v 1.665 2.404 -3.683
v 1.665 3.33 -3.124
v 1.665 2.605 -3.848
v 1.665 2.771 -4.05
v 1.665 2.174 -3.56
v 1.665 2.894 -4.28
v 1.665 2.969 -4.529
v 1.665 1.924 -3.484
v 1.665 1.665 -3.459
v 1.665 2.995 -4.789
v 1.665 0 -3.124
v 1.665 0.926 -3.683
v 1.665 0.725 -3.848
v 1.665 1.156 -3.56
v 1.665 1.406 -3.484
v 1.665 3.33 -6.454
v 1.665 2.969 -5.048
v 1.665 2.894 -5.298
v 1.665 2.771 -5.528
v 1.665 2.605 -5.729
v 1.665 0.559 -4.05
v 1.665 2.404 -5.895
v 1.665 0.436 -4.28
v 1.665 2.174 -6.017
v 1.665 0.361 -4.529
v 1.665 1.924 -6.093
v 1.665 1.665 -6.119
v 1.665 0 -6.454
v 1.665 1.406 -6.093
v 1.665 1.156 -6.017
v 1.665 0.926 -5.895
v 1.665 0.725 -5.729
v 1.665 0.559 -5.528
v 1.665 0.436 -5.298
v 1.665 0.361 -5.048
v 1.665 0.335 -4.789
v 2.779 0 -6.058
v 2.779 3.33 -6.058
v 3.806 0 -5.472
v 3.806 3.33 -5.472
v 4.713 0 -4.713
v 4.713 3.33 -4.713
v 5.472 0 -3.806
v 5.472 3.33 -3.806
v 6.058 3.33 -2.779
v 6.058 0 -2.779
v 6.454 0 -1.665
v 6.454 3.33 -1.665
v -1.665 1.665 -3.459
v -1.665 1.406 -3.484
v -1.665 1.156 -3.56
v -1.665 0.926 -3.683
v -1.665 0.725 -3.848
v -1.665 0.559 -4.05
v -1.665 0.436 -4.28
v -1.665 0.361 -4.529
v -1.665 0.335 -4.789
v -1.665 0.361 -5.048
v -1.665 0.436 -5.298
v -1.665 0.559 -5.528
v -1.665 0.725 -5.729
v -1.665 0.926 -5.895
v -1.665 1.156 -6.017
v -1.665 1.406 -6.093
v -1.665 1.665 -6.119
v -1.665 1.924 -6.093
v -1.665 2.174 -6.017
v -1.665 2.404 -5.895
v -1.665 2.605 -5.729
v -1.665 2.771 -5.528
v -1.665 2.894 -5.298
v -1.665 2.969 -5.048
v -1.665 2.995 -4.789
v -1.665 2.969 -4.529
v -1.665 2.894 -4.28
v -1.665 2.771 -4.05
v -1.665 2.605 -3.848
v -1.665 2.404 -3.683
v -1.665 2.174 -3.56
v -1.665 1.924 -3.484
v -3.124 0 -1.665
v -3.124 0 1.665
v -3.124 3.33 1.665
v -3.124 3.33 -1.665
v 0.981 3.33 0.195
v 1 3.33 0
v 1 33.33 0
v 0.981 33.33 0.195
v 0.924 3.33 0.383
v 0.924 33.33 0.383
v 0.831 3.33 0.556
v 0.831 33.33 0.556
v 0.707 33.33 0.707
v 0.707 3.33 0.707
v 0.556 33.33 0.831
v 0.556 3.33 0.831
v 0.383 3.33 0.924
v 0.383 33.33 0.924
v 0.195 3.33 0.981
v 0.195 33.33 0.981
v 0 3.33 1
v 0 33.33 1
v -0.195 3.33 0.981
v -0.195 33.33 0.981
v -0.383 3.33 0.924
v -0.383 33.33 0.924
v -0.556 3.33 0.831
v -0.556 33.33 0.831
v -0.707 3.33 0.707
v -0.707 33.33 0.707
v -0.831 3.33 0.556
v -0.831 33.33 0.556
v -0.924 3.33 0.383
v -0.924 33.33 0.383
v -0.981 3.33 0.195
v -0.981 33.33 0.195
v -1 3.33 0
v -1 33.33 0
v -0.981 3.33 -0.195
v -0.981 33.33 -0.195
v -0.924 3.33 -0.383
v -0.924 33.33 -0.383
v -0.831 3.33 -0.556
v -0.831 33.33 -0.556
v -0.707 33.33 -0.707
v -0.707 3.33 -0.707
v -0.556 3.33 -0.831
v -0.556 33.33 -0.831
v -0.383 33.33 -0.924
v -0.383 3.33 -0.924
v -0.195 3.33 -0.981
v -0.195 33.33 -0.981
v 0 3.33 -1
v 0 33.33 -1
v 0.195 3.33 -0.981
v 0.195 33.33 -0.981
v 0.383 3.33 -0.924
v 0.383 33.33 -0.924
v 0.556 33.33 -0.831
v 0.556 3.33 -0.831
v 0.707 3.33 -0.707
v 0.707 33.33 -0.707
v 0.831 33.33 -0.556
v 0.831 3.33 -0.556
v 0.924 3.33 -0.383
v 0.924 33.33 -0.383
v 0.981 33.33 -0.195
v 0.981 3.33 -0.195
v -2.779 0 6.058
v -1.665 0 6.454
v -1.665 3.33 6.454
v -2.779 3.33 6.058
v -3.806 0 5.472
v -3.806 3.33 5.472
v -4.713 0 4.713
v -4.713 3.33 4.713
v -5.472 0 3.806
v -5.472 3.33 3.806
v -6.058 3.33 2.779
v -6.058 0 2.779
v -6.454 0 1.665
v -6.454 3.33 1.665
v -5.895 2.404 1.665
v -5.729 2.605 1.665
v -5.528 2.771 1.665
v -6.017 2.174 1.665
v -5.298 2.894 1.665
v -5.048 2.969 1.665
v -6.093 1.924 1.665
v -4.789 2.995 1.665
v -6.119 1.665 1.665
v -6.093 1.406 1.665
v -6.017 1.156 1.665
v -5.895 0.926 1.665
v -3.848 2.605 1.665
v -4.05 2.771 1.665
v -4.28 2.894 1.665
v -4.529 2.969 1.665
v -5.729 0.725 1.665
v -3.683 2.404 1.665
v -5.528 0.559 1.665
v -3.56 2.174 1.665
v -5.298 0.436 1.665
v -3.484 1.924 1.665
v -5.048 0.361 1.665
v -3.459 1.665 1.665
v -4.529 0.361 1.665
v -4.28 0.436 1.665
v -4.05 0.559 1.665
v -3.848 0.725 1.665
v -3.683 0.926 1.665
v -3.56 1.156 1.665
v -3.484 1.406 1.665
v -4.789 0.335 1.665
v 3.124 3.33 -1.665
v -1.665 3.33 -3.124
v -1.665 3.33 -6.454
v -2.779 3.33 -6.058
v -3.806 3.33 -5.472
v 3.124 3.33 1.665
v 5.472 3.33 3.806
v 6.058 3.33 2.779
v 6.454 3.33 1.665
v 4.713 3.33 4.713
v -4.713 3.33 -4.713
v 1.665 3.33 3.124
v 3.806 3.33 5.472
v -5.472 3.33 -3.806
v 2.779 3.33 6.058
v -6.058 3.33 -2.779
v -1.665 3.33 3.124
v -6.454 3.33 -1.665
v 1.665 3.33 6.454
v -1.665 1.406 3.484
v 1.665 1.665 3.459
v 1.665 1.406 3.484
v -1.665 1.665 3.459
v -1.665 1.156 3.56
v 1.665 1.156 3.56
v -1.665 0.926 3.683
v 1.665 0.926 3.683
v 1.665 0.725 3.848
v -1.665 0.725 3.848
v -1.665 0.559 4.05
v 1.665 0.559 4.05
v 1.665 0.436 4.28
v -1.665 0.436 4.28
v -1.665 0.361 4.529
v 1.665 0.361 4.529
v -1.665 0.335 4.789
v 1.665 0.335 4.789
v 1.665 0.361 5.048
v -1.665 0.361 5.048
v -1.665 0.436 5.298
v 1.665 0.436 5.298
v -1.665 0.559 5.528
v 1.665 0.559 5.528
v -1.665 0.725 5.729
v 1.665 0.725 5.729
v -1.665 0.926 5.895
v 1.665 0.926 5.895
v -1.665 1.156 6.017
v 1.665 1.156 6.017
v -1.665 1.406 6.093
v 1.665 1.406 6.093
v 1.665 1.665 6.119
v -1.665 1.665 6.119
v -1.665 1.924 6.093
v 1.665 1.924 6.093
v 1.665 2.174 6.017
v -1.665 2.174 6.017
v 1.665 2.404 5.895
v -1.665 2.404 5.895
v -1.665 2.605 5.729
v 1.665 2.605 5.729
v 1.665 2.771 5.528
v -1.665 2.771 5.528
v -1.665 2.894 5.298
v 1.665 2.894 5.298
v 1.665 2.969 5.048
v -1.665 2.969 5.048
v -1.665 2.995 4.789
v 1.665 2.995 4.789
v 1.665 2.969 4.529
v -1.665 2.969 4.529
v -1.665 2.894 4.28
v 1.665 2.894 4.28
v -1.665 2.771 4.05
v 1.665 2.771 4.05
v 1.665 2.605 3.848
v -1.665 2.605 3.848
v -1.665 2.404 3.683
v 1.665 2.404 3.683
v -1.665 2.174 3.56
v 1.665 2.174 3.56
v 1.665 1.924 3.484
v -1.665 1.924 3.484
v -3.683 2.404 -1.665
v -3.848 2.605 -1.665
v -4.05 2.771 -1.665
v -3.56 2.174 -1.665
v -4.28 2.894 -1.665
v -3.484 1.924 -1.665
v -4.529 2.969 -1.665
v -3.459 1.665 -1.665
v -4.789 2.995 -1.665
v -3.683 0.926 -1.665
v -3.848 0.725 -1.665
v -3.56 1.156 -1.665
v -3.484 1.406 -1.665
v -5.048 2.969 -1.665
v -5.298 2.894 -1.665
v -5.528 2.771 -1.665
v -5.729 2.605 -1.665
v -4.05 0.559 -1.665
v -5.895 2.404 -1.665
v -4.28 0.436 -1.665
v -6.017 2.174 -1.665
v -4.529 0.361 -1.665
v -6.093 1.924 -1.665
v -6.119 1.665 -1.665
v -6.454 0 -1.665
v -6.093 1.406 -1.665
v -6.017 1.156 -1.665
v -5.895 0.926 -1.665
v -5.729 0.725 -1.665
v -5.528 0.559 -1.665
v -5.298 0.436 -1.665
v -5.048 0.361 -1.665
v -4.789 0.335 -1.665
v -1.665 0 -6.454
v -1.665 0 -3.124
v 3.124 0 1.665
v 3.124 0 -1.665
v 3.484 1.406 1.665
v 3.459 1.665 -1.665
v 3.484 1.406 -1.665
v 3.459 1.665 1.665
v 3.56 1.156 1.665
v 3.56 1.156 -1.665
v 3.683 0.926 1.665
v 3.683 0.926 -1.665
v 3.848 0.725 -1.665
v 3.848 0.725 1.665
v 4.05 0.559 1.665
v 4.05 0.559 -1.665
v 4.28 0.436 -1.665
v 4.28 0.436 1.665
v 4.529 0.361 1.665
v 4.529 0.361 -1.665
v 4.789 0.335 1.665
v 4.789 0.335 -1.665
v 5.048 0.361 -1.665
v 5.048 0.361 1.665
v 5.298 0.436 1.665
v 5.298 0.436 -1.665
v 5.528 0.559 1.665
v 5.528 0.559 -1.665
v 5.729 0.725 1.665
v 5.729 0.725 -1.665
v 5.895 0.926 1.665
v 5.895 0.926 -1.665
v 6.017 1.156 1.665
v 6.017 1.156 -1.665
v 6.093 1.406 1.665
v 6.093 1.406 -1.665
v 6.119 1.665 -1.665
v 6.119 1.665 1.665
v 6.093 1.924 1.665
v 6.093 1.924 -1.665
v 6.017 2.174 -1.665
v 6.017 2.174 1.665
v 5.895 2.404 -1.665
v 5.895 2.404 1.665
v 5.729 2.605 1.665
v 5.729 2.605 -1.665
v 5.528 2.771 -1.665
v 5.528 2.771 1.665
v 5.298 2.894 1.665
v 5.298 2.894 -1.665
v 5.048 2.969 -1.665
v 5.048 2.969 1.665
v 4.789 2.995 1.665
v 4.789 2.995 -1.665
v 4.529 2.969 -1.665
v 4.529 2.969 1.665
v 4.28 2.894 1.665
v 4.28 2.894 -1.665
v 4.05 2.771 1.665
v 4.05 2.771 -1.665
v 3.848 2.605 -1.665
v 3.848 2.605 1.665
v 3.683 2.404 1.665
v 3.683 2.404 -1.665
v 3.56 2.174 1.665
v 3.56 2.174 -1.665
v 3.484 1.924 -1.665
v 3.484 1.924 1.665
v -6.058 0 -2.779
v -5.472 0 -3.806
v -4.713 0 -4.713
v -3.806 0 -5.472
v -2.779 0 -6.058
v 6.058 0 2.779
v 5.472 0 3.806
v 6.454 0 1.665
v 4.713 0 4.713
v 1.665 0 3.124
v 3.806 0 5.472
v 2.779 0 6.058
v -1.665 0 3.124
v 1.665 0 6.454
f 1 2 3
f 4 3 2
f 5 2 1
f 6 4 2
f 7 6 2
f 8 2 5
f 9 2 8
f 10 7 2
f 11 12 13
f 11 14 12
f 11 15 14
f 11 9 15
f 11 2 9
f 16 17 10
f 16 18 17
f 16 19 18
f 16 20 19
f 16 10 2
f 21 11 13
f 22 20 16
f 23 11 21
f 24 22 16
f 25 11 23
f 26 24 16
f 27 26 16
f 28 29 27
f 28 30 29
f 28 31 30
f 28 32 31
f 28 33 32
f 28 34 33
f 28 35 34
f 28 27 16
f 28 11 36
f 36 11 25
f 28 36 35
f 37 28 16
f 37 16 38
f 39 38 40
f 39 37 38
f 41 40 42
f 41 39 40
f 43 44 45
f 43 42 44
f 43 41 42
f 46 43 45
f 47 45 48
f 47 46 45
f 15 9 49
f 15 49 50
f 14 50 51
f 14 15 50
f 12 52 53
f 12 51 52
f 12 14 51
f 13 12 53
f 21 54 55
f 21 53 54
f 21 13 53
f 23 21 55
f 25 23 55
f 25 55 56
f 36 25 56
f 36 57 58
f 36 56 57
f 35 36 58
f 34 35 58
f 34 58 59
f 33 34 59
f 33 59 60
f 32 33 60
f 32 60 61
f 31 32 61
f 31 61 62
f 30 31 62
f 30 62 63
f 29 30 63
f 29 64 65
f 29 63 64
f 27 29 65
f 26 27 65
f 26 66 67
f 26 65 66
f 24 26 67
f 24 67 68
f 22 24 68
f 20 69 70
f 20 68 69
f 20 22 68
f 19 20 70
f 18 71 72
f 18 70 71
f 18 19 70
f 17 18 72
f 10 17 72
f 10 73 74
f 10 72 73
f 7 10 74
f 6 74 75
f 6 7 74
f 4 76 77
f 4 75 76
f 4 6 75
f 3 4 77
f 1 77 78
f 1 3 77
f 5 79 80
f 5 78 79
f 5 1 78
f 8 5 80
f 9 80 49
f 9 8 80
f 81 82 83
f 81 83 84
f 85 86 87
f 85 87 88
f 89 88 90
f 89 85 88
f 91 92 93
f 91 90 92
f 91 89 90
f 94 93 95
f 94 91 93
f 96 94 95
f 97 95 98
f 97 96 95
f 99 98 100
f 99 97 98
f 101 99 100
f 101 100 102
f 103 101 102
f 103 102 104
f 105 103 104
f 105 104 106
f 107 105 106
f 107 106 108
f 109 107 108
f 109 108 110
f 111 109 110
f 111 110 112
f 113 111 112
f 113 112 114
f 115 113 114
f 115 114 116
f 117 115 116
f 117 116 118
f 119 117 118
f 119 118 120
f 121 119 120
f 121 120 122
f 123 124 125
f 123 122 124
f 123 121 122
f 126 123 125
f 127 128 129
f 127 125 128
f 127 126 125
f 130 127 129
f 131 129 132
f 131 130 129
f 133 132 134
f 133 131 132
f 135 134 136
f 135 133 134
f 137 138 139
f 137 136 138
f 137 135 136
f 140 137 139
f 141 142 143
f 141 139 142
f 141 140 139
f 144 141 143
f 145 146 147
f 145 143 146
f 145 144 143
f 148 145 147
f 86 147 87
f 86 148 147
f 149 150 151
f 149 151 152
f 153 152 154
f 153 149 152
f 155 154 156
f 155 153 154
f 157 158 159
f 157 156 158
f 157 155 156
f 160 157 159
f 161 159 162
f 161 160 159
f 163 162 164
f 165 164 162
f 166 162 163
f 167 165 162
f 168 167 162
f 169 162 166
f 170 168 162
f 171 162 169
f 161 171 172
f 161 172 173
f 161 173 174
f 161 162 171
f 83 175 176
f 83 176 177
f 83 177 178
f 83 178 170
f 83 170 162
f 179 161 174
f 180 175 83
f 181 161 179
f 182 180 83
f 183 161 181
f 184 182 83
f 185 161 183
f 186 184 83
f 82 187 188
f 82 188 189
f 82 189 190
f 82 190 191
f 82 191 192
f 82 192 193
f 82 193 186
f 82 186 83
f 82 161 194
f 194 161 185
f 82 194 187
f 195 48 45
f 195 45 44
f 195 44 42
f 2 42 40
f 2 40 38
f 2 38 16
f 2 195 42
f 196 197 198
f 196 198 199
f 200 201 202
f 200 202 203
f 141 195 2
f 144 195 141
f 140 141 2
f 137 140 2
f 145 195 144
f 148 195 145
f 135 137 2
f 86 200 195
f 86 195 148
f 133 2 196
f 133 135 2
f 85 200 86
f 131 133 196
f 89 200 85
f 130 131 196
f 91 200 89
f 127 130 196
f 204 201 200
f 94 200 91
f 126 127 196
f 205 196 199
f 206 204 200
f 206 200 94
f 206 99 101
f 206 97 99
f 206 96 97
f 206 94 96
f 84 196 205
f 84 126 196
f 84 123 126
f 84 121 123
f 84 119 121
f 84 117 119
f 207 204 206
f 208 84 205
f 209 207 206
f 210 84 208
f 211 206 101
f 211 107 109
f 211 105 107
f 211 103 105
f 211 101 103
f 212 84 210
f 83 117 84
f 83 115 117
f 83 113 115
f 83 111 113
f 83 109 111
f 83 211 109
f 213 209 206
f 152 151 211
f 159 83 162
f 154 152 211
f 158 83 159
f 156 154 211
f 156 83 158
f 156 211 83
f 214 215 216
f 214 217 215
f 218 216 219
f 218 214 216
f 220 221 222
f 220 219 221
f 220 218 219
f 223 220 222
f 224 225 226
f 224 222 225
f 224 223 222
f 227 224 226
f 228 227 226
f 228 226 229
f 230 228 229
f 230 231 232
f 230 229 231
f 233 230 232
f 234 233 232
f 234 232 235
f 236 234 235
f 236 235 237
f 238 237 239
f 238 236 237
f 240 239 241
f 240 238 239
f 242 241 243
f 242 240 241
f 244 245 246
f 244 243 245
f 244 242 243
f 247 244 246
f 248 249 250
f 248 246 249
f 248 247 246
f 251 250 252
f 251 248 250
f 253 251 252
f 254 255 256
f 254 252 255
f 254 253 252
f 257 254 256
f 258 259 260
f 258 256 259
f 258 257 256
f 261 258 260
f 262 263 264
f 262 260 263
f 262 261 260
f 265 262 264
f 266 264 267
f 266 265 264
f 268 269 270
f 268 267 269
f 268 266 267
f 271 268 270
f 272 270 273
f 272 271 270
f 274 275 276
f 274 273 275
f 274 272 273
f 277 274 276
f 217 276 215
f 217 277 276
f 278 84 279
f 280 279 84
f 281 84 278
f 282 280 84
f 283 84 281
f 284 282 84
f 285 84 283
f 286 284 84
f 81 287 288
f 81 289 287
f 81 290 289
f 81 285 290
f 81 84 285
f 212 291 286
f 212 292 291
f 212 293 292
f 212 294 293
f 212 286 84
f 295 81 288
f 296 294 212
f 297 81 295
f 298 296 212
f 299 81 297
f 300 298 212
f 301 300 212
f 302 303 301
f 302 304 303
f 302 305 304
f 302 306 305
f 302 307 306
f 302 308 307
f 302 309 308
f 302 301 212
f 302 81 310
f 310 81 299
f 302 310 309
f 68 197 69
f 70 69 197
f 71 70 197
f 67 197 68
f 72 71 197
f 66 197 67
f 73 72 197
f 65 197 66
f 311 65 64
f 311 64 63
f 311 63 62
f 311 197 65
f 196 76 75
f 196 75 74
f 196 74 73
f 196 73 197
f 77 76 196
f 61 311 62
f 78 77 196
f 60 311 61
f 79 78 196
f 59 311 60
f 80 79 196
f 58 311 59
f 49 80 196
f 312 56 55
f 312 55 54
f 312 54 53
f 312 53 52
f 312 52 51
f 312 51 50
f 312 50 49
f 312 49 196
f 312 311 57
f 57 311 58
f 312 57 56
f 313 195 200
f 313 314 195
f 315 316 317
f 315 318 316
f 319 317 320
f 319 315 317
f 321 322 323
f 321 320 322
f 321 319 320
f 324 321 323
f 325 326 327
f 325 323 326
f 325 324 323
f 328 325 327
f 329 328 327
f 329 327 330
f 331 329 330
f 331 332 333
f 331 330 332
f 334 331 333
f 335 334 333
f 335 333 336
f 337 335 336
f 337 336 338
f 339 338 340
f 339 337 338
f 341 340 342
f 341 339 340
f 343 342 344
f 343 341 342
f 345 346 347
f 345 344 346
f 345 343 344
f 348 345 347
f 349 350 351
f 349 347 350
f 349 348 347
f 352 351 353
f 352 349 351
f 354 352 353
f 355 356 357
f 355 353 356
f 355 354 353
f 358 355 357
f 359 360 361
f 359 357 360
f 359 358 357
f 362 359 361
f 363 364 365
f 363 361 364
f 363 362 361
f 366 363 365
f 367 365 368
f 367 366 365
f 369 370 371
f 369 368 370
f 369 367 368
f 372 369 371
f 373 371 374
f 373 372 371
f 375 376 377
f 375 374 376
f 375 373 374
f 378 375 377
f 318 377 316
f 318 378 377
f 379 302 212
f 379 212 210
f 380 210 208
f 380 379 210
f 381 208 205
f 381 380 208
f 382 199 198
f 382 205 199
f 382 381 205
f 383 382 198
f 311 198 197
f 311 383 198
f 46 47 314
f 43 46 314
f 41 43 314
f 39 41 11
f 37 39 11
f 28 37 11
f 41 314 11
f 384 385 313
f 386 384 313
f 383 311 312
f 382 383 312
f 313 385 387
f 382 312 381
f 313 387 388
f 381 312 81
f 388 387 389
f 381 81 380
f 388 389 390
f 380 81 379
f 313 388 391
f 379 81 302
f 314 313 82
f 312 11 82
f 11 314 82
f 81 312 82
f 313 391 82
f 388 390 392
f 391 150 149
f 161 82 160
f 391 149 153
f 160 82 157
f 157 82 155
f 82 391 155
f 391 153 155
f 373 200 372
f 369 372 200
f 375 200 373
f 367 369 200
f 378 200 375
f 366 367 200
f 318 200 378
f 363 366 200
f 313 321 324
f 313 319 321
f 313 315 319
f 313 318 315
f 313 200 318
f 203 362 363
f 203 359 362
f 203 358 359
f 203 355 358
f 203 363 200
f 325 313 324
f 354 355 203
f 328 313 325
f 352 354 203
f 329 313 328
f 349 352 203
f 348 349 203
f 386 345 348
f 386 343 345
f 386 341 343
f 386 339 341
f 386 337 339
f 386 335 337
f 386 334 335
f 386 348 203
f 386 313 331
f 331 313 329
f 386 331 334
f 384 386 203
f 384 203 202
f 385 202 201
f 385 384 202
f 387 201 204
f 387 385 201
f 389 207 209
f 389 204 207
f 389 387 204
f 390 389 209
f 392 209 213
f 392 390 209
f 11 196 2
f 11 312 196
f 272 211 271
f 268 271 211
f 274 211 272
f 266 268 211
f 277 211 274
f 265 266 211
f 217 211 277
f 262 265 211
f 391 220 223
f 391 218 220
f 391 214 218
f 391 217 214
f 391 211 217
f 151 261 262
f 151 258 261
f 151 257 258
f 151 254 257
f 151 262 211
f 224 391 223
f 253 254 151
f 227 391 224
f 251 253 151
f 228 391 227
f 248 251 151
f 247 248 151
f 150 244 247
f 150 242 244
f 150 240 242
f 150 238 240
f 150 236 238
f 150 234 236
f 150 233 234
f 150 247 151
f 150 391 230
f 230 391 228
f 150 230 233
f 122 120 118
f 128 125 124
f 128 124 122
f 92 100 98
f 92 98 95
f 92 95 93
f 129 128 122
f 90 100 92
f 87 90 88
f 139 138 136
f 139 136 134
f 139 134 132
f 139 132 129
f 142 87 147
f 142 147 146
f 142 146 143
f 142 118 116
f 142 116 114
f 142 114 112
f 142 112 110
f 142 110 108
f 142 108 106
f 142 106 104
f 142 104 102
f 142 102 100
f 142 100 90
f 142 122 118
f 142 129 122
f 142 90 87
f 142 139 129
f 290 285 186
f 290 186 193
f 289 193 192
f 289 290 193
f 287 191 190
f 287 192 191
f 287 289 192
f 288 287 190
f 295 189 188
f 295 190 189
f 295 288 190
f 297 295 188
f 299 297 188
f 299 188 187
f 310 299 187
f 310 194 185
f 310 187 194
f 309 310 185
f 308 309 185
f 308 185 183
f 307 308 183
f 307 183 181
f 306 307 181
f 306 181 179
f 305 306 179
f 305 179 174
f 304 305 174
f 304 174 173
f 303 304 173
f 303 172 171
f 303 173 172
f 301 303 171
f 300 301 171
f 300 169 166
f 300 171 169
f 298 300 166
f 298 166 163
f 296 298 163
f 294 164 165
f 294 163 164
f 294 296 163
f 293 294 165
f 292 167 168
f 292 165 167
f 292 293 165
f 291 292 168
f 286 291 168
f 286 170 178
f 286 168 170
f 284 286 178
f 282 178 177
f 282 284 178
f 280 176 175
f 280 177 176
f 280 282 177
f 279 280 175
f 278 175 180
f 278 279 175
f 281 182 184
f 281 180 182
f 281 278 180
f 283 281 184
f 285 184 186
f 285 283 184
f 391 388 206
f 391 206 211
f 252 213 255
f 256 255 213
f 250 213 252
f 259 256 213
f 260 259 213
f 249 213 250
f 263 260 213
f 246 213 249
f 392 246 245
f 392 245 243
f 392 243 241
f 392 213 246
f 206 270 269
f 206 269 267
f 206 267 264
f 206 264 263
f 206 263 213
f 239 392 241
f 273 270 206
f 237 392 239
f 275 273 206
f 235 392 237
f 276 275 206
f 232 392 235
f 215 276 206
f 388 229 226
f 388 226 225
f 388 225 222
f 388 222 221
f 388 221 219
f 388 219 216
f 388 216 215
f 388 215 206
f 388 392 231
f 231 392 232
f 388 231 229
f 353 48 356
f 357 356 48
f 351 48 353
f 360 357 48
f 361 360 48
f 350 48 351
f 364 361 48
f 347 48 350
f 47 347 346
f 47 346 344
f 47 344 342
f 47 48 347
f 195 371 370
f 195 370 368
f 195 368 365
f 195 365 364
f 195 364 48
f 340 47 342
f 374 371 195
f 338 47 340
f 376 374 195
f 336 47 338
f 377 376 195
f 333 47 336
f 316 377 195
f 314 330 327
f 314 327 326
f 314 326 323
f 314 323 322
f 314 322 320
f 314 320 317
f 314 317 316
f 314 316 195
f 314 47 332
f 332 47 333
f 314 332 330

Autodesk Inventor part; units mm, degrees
ref_plane "YZ Plane" through (0, 0, 0) normal (1, 0, 0) x (0, 1, 0)
ref_plane "XZ Plane" through (0, 0, 0) normal (0, 1, 0) x (-1, 0, 0)
ref_plane "XY Plane" through (0, 0, 0) normal (0, 0, 1) x (1, 0, 0)
sketch "Sketch1" plane through (0, 0, 0) normal (0, 1, 0) x (-1, 0, 0)
  line L0 (0, 6.665) -> (0, 4.1495) construction
  line L1 (0, 4.1495) -> (0, 0) construction
  line L2 (-1.665, 6.4537) -> (-1.665, 3.1237)
  line L3 (-1.665, 3.1237) -> (1.665, 3.1237)
  line L4 (1.665, 3.1237) -> (1.665, 6.4537)
  line L5 (1.665, 6.4537) -> (-1.665, 3.1237) construction
  line L6 (-1.665, 6.4537) -> (1.665, 3.1237) construction
  line L7 (-6.665, 0) -> (-4.1495, 0) construction
  line L8 (-4.1495, 0) -> (0, 0) construction
  line L9 (-6.4537, -1.665) -> (-3.1237, -1.665)
  line L10 (-3.1237, -1.665) -> (-3.1237, 1.665)
  line L11 (-3.1237, 1.665) -> (-6.4537, 1.665)
  line L12 (-6.4537, 1.665) -> (-3.1237, -1.665) construction
  line L13 (-6.4537, -1.665) -> (-3.1237, 1.665) construction
  line L14 (0, -6.665) -> (0, -4.1495) construction
  line L15 (0, -4.1495) -> (0, 0) construction
  line L16 (1.665, -6.4537) -> (1.665, -3.1237)
  line L17 (1.665, -3.1237) -> (-1.665, -3.1237)
  line L18 (-1.665, -3.1237) -> (-1.665, -6.4537)
  line L19 (-1.665, -6.4537) -> (1.665, -3.1237) construction
  line L20 (1.665, -6.4537) -> (-1.665, -3.1237) construction
  line L21 (6.665, 0) -> (4.1495, 0) construction
  line L22 (4.1495, 0) -> (0, 0) construction
  line L23 (6.4537, 1.665) -> (3.1237, 1.665)
  line L24 (3.1237, 1.665) -> (3.1237, -1.665)
  line L25 (3.1237, -1.665) -> (6.4537, -1.665)
  line L26 (6.4537, -1.665) -> (3.1237, 1.665) construction
  line L27 (6.4537, 1.665) -> (3.1237, -1.665) construction
  arc A0 (-1.665, 6.4537) -> (-6.4537, 1.665) centre (0, 0) ccw
  arc A1 (-6.4537, -1.665) -> (-1.665, -6.4537) centre (0, 0) ccw
  arc A2 (1.665, -6.4537) -> (6.4537, -1.665) centre (0, 0) ccw
  arc A3 (6.4537, 1.665) -> (1.665, 6.4537) centre (0, 0) ccw
  point P0 (0, 4.7887)
  point P1 (-4.7887, 0)
  point P2 (0, -4.7887)
  point P3 (4.7887, 0)
  dimension "d1" = 3.33
  dimension "d4" = 360
extrude "Extrusion1" add sketch "Sketch1" along normal blind 3.33
sketch "Sketch2" plane through (-1.665, 0, 6.4537) normal (1, 0, 0) x (0, 0, -1)
  line L0 (3.33, 0) -> (3.33, 3.33) construction
  line L1 (3.33, 1.665) -> (0, 1.665) construction
  line L2 (0, 0) -> (0, 3.33) construction
  circle A0 centre (1.665, 1.665) radius 1.33
  point P0 (6.4537, 0)
  dimension "d8" = 2.66
extrude "Extrusion2" add sketch "Sketch2" along normal blind 3.33
pattern_circular "Circular Pattern1" count 4 over 360 about axis through (0, 0, 0) along (0, 1, 0) of "Extrusion2"
sketch "Sketch3" plane through (0, 3.33, 0) normal (0, 1, 0) x (1, 0, 0)
  circle A0 centre (0, 0) radius 1
  dimension "d14" = 2
extrude "Extrusion3" add sketch "Sketch3" along normal blind 30
properties part number "G-6"
